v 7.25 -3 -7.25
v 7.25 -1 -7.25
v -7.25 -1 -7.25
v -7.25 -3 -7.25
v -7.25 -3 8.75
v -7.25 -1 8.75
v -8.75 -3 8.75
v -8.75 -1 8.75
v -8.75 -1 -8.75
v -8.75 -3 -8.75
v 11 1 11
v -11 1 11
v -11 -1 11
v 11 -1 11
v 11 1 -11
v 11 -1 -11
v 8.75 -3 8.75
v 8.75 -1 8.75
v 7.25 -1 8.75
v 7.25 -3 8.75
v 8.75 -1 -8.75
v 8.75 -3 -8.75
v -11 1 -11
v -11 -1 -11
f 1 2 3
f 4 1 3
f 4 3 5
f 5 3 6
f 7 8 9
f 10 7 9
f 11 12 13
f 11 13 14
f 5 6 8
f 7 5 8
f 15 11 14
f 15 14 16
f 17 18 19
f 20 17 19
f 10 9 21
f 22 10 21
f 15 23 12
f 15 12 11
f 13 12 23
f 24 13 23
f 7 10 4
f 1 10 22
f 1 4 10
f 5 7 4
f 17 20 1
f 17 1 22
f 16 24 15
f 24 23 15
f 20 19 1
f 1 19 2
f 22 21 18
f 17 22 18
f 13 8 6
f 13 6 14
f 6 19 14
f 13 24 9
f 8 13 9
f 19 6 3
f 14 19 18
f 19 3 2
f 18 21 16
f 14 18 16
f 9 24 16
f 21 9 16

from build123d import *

# Parameters (mm, degrees)
SKETCH1_W           = 22
SKETCH1_H           = 22
BOSS_EXTRUDE1_DEPTH = 1
BOSS_EXTRUDE2_DEPTH = 2


with BuildPart() as part:
    # Sketch1 → Boss-Extrude1 (new, symmetric)
    with BuildSketch(Plane(origin=(0, 0, 0), x_dir=(1, 0, 0), z_dir=(0, 1, 0))):
        Rectangle(SKETCH1_W, SKETCH1_H)
    extrude(amount=BOSS_EXTRUDE1_DEPTH, both=True)

    # Sketch2 → Boss-Extrude2 (add)
    with BuildSketch(Plane.XZ.offset(1)):
        Polygon((-7.25, 7.25), (-7.25, 8.75), (-8.75, 8.75), (-8.75, -8.75), (8.75, -8.75), (8.75, 8.75), (7.25, 8.75), (7.25, 7.25), (7.25, -7.25), (-7.25, -7.25), align=None)
    extrude(amount=BOSS_EXTRUDE2_DEPTH)


solid = part.part
